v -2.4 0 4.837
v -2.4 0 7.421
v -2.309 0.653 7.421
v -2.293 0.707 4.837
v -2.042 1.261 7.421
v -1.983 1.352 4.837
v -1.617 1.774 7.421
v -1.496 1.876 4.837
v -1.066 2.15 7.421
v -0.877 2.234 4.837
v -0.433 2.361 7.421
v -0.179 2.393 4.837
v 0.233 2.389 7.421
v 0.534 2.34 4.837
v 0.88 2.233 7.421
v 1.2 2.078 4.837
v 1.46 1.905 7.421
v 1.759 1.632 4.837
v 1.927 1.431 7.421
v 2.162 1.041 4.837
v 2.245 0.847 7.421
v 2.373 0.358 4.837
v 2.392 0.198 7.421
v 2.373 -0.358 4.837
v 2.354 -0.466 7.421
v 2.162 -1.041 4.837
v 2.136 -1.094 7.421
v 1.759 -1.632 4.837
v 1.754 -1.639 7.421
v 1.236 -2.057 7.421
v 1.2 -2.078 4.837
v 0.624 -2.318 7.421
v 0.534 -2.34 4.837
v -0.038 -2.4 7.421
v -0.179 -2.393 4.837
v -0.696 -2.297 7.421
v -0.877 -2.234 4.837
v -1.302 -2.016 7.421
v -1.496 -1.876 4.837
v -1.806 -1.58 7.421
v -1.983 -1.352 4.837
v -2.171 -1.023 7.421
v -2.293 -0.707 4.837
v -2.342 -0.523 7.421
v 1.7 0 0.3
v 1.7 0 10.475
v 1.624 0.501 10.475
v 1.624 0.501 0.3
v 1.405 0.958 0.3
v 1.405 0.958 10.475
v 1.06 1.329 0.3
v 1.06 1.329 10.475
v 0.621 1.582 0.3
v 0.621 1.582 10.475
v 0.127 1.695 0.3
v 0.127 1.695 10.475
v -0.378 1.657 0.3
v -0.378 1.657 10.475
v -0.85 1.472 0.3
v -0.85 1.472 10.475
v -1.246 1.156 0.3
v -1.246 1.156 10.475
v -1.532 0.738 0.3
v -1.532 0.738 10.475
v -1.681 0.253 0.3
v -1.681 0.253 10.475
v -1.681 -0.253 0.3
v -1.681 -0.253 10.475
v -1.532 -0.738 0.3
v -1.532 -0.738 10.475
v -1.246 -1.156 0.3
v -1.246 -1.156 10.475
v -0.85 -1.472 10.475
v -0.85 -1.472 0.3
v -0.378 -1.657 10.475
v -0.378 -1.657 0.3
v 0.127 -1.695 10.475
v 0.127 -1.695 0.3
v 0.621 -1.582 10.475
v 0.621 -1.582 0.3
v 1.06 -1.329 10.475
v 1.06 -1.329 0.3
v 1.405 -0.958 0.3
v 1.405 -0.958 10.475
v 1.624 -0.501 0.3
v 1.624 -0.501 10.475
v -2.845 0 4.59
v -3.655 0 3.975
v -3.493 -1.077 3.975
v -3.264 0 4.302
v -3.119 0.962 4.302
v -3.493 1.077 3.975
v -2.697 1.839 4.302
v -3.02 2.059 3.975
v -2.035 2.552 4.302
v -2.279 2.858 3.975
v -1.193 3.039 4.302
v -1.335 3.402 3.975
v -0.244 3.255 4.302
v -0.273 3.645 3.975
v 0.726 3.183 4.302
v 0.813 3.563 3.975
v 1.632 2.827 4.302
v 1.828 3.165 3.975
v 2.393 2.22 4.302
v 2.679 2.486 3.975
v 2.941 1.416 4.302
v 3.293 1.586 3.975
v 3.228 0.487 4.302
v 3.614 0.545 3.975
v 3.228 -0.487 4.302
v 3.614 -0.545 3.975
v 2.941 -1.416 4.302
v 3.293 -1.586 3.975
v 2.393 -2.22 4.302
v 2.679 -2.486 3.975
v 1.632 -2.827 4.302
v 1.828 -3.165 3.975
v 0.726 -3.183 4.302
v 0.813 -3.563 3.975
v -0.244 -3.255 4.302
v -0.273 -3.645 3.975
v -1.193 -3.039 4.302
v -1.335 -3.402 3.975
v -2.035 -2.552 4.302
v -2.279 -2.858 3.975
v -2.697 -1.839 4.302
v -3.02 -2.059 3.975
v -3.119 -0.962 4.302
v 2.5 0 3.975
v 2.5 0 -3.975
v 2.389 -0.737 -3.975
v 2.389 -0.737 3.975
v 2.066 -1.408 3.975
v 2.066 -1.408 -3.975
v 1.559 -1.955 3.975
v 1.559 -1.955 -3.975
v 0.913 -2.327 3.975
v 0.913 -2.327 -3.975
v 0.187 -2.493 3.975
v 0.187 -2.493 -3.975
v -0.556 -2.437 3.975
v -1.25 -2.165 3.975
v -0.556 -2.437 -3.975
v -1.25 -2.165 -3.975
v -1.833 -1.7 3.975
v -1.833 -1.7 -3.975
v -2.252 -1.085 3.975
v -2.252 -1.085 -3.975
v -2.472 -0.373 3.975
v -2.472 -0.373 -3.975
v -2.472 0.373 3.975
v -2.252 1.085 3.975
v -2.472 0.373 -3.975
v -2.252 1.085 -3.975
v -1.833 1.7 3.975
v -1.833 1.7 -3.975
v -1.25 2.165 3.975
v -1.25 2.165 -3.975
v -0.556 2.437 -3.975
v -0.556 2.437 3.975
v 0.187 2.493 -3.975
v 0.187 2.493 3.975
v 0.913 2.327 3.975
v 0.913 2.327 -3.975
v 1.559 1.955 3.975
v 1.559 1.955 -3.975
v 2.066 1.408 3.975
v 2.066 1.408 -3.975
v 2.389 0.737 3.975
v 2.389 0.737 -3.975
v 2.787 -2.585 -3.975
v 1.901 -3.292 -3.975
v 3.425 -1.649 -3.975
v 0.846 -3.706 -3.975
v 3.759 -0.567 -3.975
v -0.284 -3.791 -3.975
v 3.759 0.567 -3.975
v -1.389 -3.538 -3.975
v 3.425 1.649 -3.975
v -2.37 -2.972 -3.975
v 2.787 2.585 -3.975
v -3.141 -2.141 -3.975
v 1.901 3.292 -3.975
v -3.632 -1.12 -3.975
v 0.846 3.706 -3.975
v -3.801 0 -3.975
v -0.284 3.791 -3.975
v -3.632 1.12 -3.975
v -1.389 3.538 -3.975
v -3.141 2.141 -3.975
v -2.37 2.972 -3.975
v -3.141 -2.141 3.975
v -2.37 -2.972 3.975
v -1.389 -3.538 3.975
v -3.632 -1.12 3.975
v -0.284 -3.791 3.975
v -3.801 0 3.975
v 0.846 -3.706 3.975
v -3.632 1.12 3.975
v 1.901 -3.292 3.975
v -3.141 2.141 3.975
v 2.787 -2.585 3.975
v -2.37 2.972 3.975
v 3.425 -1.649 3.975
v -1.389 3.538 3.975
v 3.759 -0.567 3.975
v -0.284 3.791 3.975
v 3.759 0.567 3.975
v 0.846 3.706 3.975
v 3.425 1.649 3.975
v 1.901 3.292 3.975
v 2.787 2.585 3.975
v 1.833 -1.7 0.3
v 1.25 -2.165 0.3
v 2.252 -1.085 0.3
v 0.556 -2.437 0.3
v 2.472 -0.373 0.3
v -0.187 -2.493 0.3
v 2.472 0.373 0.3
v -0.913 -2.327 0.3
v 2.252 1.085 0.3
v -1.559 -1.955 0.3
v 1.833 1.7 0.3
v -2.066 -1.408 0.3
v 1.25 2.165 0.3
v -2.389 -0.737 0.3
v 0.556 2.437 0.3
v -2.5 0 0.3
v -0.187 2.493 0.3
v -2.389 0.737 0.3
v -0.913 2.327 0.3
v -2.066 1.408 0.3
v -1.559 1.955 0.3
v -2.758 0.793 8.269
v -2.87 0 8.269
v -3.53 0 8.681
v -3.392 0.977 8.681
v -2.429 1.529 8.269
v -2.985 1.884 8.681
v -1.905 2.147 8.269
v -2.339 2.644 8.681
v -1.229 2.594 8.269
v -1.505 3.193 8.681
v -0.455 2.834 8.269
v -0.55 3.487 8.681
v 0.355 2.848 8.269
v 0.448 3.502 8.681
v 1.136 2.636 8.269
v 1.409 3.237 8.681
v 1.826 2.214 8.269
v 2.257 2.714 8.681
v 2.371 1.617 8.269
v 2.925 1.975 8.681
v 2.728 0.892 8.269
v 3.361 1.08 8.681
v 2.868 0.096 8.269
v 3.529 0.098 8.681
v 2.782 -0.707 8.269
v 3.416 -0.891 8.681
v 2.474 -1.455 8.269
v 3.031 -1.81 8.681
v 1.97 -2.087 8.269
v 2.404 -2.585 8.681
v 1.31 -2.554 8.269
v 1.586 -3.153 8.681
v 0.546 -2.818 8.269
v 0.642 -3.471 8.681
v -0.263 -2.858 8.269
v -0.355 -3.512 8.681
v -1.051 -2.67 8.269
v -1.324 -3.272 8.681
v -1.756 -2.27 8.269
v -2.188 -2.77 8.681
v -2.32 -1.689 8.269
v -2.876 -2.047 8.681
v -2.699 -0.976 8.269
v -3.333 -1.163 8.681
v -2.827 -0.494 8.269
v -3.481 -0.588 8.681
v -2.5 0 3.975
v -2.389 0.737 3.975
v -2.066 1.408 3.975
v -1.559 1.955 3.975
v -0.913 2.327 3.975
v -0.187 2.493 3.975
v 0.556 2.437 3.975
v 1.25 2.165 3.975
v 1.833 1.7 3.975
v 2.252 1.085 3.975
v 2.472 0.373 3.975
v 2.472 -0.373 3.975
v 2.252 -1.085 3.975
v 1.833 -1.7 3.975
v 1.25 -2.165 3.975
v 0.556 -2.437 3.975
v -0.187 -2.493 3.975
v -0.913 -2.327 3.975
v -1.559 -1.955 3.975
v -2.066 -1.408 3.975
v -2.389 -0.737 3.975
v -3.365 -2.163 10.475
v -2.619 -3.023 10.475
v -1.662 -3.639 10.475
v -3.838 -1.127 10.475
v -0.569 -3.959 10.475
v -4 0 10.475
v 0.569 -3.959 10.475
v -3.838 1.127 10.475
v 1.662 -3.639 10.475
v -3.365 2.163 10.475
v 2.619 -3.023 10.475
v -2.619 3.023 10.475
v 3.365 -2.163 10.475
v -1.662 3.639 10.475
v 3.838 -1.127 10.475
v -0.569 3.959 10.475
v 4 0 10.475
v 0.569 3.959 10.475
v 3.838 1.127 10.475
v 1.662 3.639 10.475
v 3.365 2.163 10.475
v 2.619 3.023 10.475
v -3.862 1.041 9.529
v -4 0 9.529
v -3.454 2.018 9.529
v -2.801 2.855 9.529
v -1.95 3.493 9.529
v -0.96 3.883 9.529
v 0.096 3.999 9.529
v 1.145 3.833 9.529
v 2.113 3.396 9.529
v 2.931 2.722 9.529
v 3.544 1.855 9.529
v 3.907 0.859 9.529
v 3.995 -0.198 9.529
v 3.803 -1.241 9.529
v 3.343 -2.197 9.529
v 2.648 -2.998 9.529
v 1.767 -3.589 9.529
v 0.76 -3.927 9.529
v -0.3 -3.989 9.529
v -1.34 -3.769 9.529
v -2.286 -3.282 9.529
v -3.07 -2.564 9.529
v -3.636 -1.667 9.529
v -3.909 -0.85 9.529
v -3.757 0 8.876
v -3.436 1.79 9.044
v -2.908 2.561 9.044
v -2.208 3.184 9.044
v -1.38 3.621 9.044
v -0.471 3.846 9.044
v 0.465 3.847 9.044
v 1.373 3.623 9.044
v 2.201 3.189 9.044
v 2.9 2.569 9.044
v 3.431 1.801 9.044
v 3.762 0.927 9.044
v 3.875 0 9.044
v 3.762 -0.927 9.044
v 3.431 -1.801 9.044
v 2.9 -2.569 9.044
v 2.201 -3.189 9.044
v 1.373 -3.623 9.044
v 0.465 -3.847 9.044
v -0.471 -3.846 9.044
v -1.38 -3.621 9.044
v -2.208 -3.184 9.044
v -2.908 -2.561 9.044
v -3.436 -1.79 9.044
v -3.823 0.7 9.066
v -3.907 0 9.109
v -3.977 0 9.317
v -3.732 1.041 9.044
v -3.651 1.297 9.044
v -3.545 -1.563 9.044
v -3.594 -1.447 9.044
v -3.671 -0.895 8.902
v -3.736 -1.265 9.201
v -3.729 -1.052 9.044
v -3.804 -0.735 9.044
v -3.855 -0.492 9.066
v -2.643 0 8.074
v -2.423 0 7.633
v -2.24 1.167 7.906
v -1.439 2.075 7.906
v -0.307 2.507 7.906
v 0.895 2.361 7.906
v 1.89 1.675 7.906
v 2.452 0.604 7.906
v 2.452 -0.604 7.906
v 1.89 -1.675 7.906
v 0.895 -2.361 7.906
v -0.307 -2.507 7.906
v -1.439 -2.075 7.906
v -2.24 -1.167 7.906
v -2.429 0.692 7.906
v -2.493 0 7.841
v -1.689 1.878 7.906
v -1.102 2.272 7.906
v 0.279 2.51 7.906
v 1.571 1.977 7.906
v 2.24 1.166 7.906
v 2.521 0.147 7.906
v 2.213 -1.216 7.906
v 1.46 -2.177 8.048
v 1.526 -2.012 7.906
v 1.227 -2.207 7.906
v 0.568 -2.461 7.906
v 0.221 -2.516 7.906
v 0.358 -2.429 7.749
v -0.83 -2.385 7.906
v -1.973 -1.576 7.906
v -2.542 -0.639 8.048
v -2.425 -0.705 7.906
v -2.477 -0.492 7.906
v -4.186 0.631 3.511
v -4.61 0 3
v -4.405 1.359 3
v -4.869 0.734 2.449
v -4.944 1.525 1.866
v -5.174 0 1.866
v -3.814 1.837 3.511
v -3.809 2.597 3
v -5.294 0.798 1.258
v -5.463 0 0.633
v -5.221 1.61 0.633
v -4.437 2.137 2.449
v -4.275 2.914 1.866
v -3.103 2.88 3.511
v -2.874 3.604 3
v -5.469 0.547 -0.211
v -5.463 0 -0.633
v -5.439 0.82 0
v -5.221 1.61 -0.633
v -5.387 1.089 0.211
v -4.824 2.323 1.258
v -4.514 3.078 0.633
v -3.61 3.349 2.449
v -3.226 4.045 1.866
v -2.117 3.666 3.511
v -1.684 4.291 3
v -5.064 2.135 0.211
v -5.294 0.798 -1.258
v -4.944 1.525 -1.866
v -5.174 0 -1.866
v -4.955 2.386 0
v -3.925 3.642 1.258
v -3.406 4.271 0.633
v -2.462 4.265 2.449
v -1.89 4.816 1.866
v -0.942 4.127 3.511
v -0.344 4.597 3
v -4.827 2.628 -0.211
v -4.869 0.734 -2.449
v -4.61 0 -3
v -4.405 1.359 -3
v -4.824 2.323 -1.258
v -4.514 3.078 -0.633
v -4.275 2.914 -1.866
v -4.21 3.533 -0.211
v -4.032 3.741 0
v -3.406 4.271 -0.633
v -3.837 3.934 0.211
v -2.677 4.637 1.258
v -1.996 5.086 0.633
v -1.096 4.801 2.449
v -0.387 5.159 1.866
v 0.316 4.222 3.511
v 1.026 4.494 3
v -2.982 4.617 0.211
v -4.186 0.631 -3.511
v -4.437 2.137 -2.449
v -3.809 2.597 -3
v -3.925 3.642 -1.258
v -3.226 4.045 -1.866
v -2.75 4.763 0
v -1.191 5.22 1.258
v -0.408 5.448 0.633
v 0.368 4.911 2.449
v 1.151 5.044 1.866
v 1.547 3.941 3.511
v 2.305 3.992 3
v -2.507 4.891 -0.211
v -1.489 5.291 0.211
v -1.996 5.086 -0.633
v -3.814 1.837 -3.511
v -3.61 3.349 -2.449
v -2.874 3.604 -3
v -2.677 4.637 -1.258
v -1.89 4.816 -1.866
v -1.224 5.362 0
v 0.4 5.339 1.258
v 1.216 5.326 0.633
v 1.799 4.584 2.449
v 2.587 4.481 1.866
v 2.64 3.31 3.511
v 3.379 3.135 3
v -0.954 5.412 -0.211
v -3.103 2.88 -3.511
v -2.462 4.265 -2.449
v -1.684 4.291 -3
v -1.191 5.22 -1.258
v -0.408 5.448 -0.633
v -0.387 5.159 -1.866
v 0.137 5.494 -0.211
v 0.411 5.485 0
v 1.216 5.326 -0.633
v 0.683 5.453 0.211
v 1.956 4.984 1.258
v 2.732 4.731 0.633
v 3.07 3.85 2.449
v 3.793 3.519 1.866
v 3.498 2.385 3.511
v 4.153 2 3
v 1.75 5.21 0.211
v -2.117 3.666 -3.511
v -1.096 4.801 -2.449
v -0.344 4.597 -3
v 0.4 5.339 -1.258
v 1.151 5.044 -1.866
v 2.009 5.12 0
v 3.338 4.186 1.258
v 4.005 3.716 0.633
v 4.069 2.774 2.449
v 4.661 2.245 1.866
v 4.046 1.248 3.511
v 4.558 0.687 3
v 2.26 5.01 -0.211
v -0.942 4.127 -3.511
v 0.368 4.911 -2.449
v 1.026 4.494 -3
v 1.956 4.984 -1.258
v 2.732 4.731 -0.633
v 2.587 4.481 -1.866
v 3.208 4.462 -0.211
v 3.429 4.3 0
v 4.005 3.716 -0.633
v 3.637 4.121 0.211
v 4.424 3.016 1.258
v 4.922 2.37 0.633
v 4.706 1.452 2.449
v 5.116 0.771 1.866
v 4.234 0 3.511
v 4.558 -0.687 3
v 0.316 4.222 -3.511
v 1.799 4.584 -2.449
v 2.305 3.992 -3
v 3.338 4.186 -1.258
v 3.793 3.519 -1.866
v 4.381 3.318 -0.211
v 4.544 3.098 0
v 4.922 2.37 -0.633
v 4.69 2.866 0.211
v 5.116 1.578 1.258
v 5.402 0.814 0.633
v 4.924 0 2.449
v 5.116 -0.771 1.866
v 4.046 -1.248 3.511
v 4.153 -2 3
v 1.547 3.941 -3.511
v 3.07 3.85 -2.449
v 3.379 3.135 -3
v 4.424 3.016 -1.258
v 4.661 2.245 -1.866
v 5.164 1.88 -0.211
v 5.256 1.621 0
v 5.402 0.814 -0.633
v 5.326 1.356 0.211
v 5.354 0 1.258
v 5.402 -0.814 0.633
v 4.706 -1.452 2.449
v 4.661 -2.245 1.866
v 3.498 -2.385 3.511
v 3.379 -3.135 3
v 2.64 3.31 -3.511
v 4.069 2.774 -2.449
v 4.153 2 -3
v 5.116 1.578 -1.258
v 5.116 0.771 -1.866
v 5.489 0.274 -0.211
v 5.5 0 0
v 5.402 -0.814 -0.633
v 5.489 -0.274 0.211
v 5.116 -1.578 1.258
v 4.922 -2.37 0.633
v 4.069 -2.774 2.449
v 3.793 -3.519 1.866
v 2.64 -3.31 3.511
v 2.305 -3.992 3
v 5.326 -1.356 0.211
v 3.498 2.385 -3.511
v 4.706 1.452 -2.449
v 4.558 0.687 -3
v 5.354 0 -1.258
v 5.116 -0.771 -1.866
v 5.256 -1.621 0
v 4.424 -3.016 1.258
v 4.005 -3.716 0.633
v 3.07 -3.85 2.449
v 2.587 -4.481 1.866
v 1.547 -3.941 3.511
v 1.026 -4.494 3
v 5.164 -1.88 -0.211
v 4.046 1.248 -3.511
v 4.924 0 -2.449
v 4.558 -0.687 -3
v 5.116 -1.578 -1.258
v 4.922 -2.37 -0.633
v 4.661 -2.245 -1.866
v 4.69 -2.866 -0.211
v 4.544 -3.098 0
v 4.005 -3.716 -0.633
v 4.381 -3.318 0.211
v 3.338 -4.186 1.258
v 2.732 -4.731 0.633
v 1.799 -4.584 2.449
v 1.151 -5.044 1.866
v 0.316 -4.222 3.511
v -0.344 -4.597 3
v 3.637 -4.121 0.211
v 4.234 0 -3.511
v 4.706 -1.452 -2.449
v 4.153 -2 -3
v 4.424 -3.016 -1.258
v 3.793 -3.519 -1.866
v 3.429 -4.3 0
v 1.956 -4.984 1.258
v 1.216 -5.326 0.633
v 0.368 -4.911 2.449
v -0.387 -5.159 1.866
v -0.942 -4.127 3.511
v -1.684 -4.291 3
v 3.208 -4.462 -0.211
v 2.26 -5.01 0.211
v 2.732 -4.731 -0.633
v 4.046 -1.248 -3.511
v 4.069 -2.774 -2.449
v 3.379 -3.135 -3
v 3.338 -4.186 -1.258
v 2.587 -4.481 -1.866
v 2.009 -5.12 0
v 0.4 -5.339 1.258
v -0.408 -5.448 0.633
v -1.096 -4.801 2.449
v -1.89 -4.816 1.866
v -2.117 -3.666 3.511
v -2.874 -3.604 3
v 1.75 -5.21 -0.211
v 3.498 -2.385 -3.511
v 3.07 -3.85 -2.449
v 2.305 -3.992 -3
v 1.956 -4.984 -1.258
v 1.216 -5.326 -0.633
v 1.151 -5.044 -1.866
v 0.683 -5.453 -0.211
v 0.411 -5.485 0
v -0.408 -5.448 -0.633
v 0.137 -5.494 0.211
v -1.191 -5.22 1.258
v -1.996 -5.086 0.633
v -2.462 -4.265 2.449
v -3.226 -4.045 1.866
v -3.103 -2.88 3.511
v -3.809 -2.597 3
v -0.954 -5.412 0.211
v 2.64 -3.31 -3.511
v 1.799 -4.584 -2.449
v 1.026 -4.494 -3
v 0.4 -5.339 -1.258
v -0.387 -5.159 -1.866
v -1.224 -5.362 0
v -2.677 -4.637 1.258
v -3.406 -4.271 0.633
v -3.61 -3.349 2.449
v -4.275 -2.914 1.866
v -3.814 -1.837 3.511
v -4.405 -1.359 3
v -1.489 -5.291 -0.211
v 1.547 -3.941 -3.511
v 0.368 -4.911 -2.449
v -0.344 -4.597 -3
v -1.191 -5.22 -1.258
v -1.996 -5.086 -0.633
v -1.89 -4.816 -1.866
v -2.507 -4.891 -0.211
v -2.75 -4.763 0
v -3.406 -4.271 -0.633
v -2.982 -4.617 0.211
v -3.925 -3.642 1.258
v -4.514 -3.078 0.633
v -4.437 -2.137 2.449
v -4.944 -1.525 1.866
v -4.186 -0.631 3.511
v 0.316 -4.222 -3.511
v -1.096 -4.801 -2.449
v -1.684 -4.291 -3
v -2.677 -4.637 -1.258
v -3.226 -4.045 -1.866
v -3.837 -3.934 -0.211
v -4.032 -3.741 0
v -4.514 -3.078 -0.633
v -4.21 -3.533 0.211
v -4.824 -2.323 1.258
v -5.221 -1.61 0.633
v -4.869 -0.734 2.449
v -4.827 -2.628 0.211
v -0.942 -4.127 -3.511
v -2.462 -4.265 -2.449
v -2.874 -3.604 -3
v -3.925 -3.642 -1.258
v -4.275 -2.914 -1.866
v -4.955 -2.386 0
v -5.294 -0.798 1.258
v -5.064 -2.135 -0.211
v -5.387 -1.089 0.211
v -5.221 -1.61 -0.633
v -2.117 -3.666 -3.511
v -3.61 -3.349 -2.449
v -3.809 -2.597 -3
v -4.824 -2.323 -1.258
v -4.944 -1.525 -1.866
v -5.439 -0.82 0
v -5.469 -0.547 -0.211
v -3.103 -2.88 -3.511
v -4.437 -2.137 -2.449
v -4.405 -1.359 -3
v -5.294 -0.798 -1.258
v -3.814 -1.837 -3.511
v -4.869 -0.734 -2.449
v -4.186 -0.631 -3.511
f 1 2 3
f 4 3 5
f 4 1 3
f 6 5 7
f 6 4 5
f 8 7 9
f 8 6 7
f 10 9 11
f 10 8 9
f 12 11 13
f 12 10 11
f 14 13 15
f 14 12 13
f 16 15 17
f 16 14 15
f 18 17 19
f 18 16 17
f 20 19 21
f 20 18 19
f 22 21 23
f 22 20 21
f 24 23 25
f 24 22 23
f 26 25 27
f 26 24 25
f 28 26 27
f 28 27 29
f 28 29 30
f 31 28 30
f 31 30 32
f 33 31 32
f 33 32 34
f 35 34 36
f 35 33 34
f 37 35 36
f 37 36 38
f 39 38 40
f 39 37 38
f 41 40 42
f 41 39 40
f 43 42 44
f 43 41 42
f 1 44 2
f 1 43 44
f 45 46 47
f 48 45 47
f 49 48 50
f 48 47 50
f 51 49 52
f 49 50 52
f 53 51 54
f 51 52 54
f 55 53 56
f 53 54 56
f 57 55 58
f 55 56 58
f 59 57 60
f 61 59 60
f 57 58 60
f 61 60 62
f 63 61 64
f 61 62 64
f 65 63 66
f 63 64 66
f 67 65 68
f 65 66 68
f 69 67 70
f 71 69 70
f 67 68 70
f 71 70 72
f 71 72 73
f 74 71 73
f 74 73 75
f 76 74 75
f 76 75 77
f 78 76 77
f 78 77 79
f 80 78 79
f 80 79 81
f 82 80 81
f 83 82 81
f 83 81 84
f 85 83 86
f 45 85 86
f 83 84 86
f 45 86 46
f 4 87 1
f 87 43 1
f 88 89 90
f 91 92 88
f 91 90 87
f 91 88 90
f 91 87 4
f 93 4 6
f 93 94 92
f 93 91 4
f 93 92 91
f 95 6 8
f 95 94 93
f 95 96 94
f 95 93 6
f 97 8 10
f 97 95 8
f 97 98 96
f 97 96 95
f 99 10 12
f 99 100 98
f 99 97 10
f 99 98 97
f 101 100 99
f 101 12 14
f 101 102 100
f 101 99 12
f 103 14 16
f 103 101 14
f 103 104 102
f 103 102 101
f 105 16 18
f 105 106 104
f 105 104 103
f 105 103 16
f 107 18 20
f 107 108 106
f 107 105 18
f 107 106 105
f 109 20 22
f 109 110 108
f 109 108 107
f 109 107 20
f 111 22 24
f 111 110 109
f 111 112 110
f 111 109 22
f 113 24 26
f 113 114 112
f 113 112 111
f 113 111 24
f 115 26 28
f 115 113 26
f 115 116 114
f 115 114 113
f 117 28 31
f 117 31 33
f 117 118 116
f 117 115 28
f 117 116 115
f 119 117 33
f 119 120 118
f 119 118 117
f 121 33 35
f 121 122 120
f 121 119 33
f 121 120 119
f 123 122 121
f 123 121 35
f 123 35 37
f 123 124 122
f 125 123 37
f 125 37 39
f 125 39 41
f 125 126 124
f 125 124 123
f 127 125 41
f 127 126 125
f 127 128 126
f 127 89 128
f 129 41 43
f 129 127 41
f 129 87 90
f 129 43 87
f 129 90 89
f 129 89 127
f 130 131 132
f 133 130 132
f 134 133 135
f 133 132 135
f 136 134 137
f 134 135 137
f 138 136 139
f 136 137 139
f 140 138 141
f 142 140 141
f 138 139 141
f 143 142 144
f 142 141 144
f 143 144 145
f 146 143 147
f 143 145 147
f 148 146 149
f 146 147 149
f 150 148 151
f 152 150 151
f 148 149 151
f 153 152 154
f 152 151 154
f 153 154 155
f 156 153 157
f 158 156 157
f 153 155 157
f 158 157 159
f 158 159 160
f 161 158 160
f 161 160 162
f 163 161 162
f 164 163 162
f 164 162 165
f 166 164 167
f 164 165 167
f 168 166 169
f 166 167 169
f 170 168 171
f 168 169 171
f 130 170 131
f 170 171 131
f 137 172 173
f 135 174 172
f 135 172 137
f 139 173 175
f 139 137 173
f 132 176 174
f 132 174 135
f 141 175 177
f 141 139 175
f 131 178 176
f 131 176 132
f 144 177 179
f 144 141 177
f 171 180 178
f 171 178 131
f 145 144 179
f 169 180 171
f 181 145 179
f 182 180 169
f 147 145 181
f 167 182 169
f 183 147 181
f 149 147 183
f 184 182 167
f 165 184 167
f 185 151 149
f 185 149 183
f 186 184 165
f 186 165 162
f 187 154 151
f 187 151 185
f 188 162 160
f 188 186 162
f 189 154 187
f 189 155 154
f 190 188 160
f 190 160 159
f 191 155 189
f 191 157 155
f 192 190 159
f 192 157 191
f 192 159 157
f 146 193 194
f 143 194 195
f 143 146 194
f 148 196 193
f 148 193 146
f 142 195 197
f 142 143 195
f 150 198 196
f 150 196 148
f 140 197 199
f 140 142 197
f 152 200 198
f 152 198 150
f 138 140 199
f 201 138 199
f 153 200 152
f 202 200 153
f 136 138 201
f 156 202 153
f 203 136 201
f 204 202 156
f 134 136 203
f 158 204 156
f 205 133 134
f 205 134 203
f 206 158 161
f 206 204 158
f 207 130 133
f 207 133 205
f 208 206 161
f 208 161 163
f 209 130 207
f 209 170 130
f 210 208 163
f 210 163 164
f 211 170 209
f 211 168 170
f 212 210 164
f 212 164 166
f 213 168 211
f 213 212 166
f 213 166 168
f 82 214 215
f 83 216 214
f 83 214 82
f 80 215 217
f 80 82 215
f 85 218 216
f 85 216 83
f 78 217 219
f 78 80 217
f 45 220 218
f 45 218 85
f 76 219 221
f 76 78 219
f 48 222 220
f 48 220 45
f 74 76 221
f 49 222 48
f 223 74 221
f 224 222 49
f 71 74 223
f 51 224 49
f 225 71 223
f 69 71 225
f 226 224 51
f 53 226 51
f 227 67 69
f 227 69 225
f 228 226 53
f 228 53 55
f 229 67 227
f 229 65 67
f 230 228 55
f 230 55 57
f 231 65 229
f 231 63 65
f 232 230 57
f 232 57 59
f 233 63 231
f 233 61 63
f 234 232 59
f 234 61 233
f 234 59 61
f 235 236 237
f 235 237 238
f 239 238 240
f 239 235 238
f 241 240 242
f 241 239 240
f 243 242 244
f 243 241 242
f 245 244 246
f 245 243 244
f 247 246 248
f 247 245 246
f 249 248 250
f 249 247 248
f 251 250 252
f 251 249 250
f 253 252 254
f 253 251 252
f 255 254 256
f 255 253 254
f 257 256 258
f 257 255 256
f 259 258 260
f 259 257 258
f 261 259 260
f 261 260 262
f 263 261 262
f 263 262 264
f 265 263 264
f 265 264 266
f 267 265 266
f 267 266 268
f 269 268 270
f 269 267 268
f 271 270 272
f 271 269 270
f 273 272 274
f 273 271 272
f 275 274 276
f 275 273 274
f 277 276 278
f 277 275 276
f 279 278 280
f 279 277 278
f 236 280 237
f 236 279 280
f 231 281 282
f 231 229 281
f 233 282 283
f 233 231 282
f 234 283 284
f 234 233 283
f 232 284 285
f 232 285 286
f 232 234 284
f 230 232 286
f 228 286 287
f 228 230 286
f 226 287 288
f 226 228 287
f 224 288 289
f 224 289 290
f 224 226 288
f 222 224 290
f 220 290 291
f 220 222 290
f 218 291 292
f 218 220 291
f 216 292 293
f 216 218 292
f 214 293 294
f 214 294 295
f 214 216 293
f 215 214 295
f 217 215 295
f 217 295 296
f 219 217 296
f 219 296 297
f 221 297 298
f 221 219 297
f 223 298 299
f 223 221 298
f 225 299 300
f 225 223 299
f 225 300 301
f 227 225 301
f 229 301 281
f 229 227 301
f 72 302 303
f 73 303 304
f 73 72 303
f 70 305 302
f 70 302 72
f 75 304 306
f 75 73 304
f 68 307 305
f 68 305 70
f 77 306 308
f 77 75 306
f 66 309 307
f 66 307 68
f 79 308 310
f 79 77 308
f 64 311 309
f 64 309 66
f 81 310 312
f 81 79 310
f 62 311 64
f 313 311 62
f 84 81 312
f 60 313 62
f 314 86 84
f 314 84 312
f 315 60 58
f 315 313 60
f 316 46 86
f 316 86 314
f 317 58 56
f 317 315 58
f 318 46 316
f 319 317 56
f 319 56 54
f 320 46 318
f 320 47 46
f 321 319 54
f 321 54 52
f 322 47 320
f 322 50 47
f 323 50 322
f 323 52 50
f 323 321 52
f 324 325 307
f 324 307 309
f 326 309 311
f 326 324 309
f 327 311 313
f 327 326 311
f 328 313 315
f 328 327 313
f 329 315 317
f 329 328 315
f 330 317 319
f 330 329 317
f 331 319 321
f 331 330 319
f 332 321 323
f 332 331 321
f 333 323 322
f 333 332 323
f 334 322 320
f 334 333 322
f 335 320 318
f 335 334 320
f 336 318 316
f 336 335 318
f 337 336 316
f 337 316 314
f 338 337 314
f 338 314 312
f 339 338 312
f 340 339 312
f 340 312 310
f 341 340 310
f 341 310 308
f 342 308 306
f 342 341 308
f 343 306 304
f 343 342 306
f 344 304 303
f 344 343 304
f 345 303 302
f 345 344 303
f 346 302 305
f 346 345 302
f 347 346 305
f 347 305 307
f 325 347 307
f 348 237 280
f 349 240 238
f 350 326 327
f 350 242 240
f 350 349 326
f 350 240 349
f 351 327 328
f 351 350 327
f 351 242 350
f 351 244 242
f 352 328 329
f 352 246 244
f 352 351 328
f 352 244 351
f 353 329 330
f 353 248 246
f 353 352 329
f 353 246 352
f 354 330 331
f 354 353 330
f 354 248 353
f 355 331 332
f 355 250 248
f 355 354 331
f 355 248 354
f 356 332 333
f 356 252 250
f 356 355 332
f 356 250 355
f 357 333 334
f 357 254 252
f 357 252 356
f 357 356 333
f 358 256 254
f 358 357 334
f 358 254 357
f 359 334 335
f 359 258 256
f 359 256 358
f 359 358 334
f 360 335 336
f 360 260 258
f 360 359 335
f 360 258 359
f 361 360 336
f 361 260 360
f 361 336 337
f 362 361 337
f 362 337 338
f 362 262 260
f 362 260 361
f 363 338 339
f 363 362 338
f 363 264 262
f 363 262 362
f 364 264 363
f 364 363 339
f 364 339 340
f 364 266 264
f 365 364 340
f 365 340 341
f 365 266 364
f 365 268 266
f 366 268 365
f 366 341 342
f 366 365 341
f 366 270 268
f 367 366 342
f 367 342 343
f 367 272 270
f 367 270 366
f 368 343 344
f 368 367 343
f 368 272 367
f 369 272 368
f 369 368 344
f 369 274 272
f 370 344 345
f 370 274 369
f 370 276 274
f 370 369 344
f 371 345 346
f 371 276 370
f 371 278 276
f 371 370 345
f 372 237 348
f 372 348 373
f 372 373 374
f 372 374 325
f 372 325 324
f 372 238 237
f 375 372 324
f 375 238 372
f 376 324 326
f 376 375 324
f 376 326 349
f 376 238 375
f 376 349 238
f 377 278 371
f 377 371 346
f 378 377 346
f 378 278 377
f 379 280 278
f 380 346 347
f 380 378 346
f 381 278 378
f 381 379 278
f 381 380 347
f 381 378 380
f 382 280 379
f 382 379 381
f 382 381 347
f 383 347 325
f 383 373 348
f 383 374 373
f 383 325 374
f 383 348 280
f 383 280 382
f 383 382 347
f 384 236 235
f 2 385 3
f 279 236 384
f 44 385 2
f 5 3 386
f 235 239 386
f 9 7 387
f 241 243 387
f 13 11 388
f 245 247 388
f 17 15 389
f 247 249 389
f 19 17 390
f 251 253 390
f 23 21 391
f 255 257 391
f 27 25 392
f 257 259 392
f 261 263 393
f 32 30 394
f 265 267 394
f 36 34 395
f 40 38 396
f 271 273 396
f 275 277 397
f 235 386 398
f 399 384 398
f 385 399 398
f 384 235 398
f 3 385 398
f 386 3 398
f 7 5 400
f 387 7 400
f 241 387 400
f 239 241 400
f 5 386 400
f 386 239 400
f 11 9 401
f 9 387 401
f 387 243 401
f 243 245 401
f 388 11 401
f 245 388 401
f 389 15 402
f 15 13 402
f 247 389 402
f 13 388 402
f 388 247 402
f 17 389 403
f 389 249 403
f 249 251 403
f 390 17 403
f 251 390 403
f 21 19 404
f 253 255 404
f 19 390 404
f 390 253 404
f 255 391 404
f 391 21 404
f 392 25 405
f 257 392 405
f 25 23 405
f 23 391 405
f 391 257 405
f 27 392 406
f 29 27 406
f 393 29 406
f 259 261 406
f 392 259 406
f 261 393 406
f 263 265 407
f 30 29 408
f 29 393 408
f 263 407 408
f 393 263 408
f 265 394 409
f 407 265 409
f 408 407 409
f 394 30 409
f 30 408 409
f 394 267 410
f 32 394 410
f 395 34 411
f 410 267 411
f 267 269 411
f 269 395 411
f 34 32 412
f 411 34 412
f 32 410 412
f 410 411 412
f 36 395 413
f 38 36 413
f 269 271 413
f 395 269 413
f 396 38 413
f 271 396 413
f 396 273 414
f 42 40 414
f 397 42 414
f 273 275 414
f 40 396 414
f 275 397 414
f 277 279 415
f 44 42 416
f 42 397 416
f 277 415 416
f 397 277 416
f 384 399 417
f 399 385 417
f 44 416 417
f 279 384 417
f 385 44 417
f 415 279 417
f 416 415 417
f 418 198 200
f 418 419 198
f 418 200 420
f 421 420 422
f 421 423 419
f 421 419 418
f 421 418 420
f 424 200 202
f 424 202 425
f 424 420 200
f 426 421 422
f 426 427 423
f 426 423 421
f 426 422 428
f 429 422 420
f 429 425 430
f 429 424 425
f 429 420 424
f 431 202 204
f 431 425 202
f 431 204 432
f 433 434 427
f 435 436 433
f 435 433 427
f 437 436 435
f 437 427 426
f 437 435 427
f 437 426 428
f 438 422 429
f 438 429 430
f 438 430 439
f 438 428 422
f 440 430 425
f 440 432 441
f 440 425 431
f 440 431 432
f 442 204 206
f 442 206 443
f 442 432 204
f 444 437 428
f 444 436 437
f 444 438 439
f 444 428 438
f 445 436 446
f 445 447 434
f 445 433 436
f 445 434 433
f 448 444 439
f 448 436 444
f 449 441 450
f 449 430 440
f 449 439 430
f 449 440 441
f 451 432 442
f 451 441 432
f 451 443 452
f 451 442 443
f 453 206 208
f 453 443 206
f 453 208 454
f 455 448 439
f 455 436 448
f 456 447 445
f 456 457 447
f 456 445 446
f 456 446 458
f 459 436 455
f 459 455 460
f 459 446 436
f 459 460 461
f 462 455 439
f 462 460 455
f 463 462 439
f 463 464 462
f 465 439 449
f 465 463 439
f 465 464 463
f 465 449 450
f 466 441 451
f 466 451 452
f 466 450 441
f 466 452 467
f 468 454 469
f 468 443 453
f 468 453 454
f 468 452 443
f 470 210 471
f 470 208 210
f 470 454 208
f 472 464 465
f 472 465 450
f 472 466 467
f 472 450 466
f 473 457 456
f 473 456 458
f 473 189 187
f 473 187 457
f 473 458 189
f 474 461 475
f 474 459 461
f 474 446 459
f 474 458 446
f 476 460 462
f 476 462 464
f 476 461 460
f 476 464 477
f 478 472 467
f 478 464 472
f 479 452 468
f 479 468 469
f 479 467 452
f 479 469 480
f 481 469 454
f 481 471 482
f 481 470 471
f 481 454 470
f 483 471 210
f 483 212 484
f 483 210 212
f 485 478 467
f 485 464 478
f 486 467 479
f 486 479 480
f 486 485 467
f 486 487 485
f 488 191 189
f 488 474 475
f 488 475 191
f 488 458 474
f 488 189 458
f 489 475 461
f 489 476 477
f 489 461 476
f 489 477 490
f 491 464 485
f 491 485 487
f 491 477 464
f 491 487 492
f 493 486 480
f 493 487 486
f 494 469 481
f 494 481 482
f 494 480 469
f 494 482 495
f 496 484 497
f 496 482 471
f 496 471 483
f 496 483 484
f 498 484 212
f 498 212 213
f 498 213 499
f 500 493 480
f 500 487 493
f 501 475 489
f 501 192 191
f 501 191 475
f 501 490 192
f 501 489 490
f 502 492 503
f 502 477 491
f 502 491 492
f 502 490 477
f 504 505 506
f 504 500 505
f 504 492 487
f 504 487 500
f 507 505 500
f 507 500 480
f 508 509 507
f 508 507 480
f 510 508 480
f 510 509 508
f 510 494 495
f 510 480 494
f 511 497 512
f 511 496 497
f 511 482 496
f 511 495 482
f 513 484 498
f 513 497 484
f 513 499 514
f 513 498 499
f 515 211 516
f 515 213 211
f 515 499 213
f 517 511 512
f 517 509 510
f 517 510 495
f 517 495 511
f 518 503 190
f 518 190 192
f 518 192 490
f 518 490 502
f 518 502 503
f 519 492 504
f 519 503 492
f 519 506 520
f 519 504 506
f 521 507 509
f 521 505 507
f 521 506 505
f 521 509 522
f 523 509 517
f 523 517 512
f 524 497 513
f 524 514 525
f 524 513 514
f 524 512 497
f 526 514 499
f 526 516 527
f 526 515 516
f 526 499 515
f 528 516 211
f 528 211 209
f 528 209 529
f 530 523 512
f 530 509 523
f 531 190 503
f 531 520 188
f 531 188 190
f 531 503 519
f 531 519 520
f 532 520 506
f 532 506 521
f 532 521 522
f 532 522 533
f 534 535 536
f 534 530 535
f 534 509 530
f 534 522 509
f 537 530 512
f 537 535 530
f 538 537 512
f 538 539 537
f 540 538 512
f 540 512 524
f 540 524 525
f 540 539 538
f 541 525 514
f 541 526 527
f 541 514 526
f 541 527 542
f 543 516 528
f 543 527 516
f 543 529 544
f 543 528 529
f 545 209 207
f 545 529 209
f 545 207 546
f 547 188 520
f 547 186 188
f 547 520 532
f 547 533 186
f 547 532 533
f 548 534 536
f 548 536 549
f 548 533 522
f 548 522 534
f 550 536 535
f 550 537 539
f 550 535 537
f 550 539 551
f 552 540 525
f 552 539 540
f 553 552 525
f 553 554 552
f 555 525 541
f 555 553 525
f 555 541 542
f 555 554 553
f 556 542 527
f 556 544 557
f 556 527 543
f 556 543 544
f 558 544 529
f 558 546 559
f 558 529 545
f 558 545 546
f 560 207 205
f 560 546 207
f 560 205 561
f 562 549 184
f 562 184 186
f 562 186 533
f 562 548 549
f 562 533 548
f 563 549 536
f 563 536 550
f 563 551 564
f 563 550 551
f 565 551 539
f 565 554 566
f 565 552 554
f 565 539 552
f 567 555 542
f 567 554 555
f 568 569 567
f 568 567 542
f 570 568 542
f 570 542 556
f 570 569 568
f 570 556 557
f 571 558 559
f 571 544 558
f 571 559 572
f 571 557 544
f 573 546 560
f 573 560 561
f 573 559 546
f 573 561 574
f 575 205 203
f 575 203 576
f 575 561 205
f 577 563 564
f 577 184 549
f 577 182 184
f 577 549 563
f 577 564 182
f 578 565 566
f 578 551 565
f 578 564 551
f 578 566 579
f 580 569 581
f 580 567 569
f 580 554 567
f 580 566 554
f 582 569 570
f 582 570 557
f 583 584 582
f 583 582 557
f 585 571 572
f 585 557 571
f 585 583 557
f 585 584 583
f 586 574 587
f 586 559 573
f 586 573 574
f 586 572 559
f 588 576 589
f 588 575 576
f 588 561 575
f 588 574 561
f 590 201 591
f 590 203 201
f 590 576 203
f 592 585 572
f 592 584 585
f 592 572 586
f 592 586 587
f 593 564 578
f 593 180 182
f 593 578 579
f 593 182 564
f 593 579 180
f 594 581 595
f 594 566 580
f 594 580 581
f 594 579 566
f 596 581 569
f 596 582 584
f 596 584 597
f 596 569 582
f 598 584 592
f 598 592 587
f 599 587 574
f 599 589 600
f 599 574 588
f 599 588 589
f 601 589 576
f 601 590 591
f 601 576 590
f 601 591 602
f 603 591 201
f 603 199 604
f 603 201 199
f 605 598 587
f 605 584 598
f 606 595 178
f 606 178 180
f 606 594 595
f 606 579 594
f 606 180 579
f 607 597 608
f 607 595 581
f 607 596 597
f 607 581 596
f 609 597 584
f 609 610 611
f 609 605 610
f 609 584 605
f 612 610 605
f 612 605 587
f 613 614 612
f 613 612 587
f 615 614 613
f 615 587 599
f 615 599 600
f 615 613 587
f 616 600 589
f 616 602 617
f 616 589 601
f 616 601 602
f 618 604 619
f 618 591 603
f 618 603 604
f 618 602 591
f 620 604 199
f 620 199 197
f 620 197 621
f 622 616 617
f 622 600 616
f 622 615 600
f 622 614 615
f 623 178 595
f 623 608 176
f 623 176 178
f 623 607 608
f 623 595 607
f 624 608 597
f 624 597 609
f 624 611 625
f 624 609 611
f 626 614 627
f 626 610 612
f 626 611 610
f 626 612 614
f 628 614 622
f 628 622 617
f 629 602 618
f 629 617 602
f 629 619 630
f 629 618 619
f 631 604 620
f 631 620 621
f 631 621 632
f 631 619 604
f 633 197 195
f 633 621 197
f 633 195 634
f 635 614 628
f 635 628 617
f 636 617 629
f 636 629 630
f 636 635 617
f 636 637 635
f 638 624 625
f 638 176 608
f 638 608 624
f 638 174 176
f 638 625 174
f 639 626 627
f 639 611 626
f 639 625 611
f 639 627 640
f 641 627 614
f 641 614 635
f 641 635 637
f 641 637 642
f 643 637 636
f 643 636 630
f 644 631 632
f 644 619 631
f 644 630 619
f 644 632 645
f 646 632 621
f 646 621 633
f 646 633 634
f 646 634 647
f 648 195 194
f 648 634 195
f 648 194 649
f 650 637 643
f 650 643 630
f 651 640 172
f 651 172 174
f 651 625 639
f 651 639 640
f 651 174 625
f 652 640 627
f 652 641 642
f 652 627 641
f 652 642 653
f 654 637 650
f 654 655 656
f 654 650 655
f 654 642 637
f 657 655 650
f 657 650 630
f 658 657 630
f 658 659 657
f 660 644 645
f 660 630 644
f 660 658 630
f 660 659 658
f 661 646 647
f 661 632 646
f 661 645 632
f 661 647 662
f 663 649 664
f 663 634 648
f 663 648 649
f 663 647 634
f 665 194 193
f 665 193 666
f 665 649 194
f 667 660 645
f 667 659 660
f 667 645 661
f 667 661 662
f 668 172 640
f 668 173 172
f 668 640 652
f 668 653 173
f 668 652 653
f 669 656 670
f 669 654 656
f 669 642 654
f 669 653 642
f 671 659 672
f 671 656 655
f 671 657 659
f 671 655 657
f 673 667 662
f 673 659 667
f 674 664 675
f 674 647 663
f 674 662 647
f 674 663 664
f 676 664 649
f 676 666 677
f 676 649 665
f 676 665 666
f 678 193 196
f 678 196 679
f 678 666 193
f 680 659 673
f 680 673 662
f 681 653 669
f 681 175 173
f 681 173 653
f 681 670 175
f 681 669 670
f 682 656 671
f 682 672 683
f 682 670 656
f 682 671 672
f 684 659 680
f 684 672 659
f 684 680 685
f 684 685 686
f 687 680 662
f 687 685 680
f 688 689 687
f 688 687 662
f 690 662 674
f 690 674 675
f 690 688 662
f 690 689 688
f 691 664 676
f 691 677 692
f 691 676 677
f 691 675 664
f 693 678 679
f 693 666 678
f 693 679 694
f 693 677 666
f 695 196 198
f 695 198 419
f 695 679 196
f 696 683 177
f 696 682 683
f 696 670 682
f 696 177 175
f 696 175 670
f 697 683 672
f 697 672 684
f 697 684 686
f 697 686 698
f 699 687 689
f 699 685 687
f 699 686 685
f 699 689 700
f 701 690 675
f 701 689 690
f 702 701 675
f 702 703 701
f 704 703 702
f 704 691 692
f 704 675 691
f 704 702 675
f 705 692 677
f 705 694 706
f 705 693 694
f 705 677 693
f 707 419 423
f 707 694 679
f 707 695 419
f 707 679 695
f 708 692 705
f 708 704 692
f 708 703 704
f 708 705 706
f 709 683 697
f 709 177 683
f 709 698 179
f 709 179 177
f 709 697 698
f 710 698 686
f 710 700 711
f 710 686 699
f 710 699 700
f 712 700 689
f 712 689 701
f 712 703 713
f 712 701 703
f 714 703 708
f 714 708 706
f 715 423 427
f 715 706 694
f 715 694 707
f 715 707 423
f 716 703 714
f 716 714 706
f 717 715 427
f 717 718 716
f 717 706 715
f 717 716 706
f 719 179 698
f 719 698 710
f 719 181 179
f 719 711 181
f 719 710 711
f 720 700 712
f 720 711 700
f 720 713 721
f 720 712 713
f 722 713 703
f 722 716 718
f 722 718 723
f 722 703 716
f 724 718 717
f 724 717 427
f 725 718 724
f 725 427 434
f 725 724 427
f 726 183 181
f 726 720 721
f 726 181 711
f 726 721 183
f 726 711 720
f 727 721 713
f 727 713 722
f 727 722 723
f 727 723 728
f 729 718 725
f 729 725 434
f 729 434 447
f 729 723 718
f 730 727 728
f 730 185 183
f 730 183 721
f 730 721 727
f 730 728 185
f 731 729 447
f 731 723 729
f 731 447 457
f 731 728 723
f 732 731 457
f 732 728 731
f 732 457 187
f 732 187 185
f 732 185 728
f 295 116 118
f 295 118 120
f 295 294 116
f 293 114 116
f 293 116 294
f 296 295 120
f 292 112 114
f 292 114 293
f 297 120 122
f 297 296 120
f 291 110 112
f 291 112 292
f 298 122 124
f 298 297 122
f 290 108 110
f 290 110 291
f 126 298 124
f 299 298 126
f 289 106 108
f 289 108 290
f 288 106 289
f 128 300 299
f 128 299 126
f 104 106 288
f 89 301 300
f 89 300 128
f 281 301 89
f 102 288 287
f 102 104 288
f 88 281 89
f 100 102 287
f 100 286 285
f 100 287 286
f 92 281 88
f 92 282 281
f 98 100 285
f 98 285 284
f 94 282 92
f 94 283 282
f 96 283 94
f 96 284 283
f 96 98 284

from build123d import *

# Parameters (mm, degrees)
F2_R     = 2.5
F3_DEPTH = 7.95
F6_R     = 1.7
F7_DEPTH = 10.175
F8_R     = 1
F9_R     = 1


with BuildPart() as f1:
    # F0 (on Front) → F1 (revolve)
    with BuildSketch(Plane.XZ):
        with BuildLine():
            Line((0, 3.975), (-3.801233, 3.975))
            ThreePointArc((-3.801233, 3.975), (-5.5, 0), (-3.801233, -3.975))
            Line((-3.801233, -3.975), (0, -3.975))
            Line((0, -3.975), (0, 3.975))
        make_face()
    revolve(axis=Axis((0, 0, 0), (0, 0, -1)))

    # F2 (on face) → F3 (cut, through all)
    with BuildSketch(Plane(origin=(0, 0, -3.975), x_dir=(1, 0, 0), z_dir=(0, 0, -1))):
        Circle(F2_R)
    extrude(amount=-F3_DEPTH, mode=Mode.SUBTRACT)


with BuildPart() as f5:
    # F4 (on Front) → F5 (revolve)
    with BuildSketch(Plane.XZ):
        with BuildLine():
            Line((0, 0.3), (0, 10.475))
            Line((0, 10.475), (-4, 10.475))
            Line((-4, 10.475), (-4, 8.975))
            Line((-4, 8.975), (-2.4, 7.975))
            Line((-2.4, 7.975), (-2.4, 4.837355))
            ThreePointArc((-2.4, 4.837355), (-3.058074, 4.450639), (-3.655048, 3.975))
            Line((-3.655048, 3.975), (-2.5, 3.975))
            Line((-2.5, 3.975), (-2.5, 0.3))
            Line((-2.5, 0.3), (0, 0.3))
        make_face()
    revolve(axis=Axis((0, 0, 5.3875), (0, 0, -1)))

    # F6 (on face) → F7 (cut, through all)
    with BuildSketch(Plane.XY.offset(10.475)):
        Circle(F6_R)
    extrude(amount=-F7_DEPTH, mode=Mode.SUBTRACT)

    # F8
    f8_edges = [f5.edges().sort_by_distance(p)[0] for p in [
        (2.4, 0, 7.975),
    ]]
    fillet(f8_edges, radius=F8_R)

    # F9
    f9_edges = [f5.edges().sort_by_distance(p)[0] for p in [
        (4, 0, 8.975),
    ]]
    fillet(f9_edges, radius=F9_R)


solid = Compound([f1.part, f5.part])
